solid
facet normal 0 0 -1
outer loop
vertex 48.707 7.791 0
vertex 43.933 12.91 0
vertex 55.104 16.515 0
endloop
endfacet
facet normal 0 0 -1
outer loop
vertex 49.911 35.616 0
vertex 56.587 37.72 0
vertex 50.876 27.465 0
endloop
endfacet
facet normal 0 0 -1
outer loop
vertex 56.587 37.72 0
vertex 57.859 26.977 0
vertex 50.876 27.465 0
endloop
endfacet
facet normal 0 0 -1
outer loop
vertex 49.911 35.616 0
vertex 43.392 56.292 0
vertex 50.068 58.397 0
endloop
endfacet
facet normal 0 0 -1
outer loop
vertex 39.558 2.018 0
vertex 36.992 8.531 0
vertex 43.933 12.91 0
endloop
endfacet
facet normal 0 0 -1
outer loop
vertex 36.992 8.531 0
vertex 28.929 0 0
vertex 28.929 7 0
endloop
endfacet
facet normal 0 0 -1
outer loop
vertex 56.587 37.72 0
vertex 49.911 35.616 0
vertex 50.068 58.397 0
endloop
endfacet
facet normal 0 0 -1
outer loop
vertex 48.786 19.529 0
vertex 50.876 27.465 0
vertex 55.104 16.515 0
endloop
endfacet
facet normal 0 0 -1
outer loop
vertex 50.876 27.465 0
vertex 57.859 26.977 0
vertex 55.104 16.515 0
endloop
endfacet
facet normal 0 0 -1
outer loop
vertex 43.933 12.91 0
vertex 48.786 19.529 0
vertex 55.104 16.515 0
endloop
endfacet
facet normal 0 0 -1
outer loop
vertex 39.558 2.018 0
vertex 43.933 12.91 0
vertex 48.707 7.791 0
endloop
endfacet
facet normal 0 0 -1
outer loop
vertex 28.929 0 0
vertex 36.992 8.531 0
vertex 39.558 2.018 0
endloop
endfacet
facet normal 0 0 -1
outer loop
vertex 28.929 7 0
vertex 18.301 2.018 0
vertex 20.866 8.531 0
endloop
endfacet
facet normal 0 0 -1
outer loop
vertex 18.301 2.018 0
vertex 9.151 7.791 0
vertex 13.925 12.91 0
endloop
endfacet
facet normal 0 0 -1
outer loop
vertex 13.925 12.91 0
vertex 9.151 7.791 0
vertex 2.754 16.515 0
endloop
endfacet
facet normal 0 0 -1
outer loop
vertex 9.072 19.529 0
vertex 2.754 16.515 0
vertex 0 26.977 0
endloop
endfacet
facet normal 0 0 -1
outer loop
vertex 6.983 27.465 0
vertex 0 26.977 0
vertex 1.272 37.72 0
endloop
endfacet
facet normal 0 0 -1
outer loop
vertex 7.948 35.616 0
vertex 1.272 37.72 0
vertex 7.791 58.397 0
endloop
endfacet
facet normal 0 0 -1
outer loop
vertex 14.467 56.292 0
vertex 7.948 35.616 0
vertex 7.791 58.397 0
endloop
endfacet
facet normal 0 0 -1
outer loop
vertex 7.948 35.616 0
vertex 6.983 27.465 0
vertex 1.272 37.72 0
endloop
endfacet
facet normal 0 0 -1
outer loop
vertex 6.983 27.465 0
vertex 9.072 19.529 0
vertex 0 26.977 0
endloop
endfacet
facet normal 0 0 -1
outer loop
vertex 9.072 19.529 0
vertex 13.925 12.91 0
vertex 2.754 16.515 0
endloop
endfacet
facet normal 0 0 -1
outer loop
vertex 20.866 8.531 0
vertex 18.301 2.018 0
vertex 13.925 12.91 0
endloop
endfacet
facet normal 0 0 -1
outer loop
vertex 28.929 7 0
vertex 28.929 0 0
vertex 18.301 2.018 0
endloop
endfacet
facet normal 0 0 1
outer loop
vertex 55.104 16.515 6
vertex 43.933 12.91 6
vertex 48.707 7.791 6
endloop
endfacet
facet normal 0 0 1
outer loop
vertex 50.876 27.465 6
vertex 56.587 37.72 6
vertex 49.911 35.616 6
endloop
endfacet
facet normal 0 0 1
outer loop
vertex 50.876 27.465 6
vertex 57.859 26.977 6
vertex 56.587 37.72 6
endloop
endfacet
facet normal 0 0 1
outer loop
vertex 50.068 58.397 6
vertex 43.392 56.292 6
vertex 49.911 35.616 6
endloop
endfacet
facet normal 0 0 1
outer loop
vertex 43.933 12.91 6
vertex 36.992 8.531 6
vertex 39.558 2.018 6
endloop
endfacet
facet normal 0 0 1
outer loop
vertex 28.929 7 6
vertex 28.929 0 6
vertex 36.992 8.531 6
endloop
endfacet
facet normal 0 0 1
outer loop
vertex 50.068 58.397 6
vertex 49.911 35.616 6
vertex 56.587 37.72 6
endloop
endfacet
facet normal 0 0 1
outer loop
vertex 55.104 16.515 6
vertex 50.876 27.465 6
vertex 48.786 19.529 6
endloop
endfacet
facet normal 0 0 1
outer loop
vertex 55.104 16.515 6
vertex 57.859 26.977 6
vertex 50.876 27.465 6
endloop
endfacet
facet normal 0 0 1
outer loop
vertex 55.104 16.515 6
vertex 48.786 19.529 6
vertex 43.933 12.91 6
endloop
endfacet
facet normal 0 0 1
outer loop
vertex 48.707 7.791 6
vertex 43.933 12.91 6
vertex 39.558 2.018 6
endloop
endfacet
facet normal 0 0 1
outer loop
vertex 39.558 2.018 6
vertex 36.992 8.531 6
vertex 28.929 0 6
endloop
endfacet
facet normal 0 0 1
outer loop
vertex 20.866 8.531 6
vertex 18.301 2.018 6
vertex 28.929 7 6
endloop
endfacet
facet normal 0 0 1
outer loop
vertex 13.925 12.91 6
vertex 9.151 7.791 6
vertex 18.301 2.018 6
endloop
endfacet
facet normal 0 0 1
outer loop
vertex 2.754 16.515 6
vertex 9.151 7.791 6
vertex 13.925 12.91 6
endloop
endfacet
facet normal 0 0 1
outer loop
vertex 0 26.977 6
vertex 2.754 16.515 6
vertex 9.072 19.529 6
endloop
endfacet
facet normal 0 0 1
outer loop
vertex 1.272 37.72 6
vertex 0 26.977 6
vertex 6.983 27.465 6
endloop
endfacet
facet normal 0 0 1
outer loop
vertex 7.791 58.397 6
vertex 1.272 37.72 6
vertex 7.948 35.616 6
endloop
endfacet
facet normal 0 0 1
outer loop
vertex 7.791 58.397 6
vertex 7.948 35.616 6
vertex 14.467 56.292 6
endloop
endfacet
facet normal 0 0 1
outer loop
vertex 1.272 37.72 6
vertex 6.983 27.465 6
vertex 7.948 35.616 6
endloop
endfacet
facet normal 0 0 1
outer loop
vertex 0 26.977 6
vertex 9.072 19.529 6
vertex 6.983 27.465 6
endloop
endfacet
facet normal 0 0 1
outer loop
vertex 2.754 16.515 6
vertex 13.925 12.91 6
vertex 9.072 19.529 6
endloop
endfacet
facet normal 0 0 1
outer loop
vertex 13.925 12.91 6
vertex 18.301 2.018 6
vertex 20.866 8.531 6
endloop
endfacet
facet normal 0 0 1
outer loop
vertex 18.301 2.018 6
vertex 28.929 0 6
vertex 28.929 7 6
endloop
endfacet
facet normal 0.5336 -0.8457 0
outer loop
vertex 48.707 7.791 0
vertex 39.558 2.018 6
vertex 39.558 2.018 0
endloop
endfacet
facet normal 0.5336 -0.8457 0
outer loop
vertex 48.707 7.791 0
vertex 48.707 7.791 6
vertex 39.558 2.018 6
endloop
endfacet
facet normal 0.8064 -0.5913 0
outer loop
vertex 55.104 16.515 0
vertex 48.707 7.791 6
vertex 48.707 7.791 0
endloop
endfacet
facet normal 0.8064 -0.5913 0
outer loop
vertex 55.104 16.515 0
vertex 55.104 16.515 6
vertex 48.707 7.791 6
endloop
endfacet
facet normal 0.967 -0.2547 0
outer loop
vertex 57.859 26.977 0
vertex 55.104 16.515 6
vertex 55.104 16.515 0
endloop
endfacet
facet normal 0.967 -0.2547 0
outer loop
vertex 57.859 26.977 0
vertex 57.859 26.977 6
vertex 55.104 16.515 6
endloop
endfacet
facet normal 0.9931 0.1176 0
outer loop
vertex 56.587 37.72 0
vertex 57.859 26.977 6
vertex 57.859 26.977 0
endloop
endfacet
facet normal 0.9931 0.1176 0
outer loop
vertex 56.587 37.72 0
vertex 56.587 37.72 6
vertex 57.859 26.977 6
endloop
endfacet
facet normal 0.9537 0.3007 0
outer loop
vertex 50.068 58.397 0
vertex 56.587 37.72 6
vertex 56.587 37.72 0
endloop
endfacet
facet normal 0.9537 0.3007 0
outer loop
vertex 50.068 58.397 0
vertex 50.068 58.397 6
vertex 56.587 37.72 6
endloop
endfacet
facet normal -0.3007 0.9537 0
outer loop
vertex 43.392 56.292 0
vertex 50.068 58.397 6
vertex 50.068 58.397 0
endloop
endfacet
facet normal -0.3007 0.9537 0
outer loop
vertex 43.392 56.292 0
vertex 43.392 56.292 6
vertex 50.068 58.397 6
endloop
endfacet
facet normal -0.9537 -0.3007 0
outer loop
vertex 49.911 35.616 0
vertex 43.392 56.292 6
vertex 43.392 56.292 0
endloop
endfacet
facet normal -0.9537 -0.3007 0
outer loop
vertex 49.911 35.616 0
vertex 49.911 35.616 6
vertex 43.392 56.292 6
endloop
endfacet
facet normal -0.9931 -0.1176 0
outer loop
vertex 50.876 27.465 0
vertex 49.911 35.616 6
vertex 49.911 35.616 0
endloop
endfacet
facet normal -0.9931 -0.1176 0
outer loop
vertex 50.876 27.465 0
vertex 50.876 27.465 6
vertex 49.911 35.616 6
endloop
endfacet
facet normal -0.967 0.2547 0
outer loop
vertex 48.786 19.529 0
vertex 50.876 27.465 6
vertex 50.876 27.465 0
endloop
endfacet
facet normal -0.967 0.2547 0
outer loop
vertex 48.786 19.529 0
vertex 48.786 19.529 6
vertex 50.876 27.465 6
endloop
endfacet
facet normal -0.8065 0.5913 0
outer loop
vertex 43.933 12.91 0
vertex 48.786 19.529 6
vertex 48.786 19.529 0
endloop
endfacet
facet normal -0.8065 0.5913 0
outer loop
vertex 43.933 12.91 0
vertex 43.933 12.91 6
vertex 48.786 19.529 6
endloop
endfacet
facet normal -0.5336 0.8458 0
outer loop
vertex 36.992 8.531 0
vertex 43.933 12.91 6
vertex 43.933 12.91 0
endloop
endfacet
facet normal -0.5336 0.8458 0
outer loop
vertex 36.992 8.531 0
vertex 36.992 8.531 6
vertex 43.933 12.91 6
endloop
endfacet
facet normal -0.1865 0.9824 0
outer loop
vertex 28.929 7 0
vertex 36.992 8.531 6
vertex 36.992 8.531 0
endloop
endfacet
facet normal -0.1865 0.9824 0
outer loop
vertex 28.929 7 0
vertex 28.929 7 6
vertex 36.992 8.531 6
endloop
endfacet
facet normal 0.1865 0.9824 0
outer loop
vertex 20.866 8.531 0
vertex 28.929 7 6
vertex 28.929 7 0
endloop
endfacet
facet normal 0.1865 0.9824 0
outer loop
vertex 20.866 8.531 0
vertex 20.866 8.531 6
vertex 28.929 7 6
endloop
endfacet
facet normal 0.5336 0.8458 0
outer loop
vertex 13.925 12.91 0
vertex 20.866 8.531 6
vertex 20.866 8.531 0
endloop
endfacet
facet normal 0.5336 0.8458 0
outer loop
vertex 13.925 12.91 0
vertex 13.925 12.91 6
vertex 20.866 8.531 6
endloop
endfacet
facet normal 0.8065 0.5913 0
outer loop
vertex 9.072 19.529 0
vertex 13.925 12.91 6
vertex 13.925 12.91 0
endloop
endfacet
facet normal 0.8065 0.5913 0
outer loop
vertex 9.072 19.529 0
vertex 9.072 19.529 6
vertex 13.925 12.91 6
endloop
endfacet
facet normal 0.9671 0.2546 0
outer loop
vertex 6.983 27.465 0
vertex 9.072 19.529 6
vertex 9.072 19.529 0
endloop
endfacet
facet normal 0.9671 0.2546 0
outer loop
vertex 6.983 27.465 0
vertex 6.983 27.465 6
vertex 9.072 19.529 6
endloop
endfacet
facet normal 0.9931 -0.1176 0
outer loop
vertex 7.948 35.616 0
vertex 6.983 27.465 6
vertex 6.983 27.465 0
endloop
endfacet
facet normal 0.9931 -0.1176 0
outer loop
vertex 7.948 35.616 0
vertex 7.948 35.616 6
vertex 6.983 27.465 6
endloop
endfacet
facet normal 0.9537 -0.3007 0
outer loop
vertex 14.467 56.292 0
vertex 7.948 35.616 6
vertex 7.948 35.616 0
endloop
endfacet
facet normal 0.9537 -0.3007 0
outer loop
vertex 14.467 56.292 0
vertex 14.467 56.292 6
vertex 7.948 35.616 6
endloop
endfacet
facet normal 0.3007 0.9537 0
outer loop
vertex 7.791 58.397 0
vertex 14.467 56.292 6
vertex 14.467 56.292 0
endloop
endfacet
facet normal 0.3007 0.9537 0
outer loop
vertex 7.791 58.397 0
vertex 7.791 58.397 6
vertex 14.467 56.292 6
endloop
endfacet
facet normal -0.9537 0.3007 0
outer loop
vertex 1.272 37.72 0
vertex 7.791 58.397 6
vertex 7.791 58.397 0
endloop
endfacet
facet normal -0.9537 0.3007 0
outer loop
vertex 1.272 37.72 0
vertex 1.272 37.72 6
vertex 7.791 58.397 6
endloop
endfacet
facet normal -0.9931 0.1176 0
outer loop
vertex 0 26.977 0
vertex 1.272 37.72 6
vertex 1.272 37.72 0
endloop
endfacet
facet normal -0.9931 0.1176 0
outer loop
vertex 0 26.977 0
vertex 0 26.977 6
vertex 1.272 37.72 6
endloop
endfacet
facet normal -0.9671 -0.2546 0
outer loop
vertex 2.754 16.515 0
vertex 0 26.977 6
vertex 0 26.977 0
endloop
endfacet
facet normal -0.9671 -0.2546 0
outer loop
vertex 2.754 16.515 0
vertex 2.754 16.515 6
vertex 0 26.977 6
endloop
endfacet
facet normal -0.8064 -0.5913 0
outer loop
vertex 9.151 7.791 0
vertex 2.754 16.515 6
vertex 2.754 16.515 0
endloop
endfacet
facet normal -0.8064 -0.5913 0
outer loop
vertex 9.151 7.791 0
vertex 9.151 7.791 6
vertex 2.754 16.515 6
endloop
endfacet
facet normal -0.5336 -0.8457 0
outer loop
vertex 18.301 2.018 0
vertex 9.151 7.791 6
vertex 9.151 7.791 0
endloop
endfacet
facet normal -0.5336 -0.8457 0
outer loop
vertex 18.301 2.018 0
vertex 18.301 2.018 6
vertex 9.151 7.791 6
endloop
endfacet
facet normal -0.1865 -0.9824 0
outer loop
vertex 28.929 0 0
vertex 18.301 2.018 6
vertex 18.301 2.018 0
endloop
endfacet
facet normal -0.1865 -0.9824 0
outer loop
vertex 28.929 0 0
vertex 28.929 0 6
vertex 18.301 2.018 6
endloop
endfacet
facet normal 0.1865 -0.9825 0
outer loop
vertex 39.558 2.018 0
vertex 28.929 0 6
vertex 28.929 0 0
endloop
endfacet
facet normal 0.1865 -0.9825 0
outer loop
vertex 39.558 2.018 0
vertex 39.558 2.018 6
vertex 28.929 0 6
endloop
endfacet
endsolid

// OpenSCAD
$fn = 32;

// ----------------------------------------------------------------------
// Clip blank: omega clip, 6 mm thick
// ----------------------------------------------------------------------

// --- parameters (mm) ---
profile_height = 6;       // extrusion height
profile_points = 26;      // points of the closed outline

profile = [[1.272, 37.72], [0, 26.977], [2.754, 16.515], [9.151, 7.791], [18.301, 2.018], [28.929, 0], [39.558, 2.018], [48.707, 7.791], [55.104, 16.515], [57.859, 26.977], [56.587, 37.72], [50.068, 58.397], [43.392, 56.292], [49.911, 35.616], [50.876, 27.465], [48.786, 19.529], [43.933, 12.91], [36.992, 8.531], [28.929, 7], [20.866, 8.531], [13.925, 12.91], [9.072, 19.529], [6.983, 27.465], [7.948, 35.616], [14.467, 56.292], [7.791, 58.397]];  // single closed polygon, 26 points, counter clockwise

// --- the one profile operation ---
linear_extrude(height = profile_height) polygon(points = profile);
